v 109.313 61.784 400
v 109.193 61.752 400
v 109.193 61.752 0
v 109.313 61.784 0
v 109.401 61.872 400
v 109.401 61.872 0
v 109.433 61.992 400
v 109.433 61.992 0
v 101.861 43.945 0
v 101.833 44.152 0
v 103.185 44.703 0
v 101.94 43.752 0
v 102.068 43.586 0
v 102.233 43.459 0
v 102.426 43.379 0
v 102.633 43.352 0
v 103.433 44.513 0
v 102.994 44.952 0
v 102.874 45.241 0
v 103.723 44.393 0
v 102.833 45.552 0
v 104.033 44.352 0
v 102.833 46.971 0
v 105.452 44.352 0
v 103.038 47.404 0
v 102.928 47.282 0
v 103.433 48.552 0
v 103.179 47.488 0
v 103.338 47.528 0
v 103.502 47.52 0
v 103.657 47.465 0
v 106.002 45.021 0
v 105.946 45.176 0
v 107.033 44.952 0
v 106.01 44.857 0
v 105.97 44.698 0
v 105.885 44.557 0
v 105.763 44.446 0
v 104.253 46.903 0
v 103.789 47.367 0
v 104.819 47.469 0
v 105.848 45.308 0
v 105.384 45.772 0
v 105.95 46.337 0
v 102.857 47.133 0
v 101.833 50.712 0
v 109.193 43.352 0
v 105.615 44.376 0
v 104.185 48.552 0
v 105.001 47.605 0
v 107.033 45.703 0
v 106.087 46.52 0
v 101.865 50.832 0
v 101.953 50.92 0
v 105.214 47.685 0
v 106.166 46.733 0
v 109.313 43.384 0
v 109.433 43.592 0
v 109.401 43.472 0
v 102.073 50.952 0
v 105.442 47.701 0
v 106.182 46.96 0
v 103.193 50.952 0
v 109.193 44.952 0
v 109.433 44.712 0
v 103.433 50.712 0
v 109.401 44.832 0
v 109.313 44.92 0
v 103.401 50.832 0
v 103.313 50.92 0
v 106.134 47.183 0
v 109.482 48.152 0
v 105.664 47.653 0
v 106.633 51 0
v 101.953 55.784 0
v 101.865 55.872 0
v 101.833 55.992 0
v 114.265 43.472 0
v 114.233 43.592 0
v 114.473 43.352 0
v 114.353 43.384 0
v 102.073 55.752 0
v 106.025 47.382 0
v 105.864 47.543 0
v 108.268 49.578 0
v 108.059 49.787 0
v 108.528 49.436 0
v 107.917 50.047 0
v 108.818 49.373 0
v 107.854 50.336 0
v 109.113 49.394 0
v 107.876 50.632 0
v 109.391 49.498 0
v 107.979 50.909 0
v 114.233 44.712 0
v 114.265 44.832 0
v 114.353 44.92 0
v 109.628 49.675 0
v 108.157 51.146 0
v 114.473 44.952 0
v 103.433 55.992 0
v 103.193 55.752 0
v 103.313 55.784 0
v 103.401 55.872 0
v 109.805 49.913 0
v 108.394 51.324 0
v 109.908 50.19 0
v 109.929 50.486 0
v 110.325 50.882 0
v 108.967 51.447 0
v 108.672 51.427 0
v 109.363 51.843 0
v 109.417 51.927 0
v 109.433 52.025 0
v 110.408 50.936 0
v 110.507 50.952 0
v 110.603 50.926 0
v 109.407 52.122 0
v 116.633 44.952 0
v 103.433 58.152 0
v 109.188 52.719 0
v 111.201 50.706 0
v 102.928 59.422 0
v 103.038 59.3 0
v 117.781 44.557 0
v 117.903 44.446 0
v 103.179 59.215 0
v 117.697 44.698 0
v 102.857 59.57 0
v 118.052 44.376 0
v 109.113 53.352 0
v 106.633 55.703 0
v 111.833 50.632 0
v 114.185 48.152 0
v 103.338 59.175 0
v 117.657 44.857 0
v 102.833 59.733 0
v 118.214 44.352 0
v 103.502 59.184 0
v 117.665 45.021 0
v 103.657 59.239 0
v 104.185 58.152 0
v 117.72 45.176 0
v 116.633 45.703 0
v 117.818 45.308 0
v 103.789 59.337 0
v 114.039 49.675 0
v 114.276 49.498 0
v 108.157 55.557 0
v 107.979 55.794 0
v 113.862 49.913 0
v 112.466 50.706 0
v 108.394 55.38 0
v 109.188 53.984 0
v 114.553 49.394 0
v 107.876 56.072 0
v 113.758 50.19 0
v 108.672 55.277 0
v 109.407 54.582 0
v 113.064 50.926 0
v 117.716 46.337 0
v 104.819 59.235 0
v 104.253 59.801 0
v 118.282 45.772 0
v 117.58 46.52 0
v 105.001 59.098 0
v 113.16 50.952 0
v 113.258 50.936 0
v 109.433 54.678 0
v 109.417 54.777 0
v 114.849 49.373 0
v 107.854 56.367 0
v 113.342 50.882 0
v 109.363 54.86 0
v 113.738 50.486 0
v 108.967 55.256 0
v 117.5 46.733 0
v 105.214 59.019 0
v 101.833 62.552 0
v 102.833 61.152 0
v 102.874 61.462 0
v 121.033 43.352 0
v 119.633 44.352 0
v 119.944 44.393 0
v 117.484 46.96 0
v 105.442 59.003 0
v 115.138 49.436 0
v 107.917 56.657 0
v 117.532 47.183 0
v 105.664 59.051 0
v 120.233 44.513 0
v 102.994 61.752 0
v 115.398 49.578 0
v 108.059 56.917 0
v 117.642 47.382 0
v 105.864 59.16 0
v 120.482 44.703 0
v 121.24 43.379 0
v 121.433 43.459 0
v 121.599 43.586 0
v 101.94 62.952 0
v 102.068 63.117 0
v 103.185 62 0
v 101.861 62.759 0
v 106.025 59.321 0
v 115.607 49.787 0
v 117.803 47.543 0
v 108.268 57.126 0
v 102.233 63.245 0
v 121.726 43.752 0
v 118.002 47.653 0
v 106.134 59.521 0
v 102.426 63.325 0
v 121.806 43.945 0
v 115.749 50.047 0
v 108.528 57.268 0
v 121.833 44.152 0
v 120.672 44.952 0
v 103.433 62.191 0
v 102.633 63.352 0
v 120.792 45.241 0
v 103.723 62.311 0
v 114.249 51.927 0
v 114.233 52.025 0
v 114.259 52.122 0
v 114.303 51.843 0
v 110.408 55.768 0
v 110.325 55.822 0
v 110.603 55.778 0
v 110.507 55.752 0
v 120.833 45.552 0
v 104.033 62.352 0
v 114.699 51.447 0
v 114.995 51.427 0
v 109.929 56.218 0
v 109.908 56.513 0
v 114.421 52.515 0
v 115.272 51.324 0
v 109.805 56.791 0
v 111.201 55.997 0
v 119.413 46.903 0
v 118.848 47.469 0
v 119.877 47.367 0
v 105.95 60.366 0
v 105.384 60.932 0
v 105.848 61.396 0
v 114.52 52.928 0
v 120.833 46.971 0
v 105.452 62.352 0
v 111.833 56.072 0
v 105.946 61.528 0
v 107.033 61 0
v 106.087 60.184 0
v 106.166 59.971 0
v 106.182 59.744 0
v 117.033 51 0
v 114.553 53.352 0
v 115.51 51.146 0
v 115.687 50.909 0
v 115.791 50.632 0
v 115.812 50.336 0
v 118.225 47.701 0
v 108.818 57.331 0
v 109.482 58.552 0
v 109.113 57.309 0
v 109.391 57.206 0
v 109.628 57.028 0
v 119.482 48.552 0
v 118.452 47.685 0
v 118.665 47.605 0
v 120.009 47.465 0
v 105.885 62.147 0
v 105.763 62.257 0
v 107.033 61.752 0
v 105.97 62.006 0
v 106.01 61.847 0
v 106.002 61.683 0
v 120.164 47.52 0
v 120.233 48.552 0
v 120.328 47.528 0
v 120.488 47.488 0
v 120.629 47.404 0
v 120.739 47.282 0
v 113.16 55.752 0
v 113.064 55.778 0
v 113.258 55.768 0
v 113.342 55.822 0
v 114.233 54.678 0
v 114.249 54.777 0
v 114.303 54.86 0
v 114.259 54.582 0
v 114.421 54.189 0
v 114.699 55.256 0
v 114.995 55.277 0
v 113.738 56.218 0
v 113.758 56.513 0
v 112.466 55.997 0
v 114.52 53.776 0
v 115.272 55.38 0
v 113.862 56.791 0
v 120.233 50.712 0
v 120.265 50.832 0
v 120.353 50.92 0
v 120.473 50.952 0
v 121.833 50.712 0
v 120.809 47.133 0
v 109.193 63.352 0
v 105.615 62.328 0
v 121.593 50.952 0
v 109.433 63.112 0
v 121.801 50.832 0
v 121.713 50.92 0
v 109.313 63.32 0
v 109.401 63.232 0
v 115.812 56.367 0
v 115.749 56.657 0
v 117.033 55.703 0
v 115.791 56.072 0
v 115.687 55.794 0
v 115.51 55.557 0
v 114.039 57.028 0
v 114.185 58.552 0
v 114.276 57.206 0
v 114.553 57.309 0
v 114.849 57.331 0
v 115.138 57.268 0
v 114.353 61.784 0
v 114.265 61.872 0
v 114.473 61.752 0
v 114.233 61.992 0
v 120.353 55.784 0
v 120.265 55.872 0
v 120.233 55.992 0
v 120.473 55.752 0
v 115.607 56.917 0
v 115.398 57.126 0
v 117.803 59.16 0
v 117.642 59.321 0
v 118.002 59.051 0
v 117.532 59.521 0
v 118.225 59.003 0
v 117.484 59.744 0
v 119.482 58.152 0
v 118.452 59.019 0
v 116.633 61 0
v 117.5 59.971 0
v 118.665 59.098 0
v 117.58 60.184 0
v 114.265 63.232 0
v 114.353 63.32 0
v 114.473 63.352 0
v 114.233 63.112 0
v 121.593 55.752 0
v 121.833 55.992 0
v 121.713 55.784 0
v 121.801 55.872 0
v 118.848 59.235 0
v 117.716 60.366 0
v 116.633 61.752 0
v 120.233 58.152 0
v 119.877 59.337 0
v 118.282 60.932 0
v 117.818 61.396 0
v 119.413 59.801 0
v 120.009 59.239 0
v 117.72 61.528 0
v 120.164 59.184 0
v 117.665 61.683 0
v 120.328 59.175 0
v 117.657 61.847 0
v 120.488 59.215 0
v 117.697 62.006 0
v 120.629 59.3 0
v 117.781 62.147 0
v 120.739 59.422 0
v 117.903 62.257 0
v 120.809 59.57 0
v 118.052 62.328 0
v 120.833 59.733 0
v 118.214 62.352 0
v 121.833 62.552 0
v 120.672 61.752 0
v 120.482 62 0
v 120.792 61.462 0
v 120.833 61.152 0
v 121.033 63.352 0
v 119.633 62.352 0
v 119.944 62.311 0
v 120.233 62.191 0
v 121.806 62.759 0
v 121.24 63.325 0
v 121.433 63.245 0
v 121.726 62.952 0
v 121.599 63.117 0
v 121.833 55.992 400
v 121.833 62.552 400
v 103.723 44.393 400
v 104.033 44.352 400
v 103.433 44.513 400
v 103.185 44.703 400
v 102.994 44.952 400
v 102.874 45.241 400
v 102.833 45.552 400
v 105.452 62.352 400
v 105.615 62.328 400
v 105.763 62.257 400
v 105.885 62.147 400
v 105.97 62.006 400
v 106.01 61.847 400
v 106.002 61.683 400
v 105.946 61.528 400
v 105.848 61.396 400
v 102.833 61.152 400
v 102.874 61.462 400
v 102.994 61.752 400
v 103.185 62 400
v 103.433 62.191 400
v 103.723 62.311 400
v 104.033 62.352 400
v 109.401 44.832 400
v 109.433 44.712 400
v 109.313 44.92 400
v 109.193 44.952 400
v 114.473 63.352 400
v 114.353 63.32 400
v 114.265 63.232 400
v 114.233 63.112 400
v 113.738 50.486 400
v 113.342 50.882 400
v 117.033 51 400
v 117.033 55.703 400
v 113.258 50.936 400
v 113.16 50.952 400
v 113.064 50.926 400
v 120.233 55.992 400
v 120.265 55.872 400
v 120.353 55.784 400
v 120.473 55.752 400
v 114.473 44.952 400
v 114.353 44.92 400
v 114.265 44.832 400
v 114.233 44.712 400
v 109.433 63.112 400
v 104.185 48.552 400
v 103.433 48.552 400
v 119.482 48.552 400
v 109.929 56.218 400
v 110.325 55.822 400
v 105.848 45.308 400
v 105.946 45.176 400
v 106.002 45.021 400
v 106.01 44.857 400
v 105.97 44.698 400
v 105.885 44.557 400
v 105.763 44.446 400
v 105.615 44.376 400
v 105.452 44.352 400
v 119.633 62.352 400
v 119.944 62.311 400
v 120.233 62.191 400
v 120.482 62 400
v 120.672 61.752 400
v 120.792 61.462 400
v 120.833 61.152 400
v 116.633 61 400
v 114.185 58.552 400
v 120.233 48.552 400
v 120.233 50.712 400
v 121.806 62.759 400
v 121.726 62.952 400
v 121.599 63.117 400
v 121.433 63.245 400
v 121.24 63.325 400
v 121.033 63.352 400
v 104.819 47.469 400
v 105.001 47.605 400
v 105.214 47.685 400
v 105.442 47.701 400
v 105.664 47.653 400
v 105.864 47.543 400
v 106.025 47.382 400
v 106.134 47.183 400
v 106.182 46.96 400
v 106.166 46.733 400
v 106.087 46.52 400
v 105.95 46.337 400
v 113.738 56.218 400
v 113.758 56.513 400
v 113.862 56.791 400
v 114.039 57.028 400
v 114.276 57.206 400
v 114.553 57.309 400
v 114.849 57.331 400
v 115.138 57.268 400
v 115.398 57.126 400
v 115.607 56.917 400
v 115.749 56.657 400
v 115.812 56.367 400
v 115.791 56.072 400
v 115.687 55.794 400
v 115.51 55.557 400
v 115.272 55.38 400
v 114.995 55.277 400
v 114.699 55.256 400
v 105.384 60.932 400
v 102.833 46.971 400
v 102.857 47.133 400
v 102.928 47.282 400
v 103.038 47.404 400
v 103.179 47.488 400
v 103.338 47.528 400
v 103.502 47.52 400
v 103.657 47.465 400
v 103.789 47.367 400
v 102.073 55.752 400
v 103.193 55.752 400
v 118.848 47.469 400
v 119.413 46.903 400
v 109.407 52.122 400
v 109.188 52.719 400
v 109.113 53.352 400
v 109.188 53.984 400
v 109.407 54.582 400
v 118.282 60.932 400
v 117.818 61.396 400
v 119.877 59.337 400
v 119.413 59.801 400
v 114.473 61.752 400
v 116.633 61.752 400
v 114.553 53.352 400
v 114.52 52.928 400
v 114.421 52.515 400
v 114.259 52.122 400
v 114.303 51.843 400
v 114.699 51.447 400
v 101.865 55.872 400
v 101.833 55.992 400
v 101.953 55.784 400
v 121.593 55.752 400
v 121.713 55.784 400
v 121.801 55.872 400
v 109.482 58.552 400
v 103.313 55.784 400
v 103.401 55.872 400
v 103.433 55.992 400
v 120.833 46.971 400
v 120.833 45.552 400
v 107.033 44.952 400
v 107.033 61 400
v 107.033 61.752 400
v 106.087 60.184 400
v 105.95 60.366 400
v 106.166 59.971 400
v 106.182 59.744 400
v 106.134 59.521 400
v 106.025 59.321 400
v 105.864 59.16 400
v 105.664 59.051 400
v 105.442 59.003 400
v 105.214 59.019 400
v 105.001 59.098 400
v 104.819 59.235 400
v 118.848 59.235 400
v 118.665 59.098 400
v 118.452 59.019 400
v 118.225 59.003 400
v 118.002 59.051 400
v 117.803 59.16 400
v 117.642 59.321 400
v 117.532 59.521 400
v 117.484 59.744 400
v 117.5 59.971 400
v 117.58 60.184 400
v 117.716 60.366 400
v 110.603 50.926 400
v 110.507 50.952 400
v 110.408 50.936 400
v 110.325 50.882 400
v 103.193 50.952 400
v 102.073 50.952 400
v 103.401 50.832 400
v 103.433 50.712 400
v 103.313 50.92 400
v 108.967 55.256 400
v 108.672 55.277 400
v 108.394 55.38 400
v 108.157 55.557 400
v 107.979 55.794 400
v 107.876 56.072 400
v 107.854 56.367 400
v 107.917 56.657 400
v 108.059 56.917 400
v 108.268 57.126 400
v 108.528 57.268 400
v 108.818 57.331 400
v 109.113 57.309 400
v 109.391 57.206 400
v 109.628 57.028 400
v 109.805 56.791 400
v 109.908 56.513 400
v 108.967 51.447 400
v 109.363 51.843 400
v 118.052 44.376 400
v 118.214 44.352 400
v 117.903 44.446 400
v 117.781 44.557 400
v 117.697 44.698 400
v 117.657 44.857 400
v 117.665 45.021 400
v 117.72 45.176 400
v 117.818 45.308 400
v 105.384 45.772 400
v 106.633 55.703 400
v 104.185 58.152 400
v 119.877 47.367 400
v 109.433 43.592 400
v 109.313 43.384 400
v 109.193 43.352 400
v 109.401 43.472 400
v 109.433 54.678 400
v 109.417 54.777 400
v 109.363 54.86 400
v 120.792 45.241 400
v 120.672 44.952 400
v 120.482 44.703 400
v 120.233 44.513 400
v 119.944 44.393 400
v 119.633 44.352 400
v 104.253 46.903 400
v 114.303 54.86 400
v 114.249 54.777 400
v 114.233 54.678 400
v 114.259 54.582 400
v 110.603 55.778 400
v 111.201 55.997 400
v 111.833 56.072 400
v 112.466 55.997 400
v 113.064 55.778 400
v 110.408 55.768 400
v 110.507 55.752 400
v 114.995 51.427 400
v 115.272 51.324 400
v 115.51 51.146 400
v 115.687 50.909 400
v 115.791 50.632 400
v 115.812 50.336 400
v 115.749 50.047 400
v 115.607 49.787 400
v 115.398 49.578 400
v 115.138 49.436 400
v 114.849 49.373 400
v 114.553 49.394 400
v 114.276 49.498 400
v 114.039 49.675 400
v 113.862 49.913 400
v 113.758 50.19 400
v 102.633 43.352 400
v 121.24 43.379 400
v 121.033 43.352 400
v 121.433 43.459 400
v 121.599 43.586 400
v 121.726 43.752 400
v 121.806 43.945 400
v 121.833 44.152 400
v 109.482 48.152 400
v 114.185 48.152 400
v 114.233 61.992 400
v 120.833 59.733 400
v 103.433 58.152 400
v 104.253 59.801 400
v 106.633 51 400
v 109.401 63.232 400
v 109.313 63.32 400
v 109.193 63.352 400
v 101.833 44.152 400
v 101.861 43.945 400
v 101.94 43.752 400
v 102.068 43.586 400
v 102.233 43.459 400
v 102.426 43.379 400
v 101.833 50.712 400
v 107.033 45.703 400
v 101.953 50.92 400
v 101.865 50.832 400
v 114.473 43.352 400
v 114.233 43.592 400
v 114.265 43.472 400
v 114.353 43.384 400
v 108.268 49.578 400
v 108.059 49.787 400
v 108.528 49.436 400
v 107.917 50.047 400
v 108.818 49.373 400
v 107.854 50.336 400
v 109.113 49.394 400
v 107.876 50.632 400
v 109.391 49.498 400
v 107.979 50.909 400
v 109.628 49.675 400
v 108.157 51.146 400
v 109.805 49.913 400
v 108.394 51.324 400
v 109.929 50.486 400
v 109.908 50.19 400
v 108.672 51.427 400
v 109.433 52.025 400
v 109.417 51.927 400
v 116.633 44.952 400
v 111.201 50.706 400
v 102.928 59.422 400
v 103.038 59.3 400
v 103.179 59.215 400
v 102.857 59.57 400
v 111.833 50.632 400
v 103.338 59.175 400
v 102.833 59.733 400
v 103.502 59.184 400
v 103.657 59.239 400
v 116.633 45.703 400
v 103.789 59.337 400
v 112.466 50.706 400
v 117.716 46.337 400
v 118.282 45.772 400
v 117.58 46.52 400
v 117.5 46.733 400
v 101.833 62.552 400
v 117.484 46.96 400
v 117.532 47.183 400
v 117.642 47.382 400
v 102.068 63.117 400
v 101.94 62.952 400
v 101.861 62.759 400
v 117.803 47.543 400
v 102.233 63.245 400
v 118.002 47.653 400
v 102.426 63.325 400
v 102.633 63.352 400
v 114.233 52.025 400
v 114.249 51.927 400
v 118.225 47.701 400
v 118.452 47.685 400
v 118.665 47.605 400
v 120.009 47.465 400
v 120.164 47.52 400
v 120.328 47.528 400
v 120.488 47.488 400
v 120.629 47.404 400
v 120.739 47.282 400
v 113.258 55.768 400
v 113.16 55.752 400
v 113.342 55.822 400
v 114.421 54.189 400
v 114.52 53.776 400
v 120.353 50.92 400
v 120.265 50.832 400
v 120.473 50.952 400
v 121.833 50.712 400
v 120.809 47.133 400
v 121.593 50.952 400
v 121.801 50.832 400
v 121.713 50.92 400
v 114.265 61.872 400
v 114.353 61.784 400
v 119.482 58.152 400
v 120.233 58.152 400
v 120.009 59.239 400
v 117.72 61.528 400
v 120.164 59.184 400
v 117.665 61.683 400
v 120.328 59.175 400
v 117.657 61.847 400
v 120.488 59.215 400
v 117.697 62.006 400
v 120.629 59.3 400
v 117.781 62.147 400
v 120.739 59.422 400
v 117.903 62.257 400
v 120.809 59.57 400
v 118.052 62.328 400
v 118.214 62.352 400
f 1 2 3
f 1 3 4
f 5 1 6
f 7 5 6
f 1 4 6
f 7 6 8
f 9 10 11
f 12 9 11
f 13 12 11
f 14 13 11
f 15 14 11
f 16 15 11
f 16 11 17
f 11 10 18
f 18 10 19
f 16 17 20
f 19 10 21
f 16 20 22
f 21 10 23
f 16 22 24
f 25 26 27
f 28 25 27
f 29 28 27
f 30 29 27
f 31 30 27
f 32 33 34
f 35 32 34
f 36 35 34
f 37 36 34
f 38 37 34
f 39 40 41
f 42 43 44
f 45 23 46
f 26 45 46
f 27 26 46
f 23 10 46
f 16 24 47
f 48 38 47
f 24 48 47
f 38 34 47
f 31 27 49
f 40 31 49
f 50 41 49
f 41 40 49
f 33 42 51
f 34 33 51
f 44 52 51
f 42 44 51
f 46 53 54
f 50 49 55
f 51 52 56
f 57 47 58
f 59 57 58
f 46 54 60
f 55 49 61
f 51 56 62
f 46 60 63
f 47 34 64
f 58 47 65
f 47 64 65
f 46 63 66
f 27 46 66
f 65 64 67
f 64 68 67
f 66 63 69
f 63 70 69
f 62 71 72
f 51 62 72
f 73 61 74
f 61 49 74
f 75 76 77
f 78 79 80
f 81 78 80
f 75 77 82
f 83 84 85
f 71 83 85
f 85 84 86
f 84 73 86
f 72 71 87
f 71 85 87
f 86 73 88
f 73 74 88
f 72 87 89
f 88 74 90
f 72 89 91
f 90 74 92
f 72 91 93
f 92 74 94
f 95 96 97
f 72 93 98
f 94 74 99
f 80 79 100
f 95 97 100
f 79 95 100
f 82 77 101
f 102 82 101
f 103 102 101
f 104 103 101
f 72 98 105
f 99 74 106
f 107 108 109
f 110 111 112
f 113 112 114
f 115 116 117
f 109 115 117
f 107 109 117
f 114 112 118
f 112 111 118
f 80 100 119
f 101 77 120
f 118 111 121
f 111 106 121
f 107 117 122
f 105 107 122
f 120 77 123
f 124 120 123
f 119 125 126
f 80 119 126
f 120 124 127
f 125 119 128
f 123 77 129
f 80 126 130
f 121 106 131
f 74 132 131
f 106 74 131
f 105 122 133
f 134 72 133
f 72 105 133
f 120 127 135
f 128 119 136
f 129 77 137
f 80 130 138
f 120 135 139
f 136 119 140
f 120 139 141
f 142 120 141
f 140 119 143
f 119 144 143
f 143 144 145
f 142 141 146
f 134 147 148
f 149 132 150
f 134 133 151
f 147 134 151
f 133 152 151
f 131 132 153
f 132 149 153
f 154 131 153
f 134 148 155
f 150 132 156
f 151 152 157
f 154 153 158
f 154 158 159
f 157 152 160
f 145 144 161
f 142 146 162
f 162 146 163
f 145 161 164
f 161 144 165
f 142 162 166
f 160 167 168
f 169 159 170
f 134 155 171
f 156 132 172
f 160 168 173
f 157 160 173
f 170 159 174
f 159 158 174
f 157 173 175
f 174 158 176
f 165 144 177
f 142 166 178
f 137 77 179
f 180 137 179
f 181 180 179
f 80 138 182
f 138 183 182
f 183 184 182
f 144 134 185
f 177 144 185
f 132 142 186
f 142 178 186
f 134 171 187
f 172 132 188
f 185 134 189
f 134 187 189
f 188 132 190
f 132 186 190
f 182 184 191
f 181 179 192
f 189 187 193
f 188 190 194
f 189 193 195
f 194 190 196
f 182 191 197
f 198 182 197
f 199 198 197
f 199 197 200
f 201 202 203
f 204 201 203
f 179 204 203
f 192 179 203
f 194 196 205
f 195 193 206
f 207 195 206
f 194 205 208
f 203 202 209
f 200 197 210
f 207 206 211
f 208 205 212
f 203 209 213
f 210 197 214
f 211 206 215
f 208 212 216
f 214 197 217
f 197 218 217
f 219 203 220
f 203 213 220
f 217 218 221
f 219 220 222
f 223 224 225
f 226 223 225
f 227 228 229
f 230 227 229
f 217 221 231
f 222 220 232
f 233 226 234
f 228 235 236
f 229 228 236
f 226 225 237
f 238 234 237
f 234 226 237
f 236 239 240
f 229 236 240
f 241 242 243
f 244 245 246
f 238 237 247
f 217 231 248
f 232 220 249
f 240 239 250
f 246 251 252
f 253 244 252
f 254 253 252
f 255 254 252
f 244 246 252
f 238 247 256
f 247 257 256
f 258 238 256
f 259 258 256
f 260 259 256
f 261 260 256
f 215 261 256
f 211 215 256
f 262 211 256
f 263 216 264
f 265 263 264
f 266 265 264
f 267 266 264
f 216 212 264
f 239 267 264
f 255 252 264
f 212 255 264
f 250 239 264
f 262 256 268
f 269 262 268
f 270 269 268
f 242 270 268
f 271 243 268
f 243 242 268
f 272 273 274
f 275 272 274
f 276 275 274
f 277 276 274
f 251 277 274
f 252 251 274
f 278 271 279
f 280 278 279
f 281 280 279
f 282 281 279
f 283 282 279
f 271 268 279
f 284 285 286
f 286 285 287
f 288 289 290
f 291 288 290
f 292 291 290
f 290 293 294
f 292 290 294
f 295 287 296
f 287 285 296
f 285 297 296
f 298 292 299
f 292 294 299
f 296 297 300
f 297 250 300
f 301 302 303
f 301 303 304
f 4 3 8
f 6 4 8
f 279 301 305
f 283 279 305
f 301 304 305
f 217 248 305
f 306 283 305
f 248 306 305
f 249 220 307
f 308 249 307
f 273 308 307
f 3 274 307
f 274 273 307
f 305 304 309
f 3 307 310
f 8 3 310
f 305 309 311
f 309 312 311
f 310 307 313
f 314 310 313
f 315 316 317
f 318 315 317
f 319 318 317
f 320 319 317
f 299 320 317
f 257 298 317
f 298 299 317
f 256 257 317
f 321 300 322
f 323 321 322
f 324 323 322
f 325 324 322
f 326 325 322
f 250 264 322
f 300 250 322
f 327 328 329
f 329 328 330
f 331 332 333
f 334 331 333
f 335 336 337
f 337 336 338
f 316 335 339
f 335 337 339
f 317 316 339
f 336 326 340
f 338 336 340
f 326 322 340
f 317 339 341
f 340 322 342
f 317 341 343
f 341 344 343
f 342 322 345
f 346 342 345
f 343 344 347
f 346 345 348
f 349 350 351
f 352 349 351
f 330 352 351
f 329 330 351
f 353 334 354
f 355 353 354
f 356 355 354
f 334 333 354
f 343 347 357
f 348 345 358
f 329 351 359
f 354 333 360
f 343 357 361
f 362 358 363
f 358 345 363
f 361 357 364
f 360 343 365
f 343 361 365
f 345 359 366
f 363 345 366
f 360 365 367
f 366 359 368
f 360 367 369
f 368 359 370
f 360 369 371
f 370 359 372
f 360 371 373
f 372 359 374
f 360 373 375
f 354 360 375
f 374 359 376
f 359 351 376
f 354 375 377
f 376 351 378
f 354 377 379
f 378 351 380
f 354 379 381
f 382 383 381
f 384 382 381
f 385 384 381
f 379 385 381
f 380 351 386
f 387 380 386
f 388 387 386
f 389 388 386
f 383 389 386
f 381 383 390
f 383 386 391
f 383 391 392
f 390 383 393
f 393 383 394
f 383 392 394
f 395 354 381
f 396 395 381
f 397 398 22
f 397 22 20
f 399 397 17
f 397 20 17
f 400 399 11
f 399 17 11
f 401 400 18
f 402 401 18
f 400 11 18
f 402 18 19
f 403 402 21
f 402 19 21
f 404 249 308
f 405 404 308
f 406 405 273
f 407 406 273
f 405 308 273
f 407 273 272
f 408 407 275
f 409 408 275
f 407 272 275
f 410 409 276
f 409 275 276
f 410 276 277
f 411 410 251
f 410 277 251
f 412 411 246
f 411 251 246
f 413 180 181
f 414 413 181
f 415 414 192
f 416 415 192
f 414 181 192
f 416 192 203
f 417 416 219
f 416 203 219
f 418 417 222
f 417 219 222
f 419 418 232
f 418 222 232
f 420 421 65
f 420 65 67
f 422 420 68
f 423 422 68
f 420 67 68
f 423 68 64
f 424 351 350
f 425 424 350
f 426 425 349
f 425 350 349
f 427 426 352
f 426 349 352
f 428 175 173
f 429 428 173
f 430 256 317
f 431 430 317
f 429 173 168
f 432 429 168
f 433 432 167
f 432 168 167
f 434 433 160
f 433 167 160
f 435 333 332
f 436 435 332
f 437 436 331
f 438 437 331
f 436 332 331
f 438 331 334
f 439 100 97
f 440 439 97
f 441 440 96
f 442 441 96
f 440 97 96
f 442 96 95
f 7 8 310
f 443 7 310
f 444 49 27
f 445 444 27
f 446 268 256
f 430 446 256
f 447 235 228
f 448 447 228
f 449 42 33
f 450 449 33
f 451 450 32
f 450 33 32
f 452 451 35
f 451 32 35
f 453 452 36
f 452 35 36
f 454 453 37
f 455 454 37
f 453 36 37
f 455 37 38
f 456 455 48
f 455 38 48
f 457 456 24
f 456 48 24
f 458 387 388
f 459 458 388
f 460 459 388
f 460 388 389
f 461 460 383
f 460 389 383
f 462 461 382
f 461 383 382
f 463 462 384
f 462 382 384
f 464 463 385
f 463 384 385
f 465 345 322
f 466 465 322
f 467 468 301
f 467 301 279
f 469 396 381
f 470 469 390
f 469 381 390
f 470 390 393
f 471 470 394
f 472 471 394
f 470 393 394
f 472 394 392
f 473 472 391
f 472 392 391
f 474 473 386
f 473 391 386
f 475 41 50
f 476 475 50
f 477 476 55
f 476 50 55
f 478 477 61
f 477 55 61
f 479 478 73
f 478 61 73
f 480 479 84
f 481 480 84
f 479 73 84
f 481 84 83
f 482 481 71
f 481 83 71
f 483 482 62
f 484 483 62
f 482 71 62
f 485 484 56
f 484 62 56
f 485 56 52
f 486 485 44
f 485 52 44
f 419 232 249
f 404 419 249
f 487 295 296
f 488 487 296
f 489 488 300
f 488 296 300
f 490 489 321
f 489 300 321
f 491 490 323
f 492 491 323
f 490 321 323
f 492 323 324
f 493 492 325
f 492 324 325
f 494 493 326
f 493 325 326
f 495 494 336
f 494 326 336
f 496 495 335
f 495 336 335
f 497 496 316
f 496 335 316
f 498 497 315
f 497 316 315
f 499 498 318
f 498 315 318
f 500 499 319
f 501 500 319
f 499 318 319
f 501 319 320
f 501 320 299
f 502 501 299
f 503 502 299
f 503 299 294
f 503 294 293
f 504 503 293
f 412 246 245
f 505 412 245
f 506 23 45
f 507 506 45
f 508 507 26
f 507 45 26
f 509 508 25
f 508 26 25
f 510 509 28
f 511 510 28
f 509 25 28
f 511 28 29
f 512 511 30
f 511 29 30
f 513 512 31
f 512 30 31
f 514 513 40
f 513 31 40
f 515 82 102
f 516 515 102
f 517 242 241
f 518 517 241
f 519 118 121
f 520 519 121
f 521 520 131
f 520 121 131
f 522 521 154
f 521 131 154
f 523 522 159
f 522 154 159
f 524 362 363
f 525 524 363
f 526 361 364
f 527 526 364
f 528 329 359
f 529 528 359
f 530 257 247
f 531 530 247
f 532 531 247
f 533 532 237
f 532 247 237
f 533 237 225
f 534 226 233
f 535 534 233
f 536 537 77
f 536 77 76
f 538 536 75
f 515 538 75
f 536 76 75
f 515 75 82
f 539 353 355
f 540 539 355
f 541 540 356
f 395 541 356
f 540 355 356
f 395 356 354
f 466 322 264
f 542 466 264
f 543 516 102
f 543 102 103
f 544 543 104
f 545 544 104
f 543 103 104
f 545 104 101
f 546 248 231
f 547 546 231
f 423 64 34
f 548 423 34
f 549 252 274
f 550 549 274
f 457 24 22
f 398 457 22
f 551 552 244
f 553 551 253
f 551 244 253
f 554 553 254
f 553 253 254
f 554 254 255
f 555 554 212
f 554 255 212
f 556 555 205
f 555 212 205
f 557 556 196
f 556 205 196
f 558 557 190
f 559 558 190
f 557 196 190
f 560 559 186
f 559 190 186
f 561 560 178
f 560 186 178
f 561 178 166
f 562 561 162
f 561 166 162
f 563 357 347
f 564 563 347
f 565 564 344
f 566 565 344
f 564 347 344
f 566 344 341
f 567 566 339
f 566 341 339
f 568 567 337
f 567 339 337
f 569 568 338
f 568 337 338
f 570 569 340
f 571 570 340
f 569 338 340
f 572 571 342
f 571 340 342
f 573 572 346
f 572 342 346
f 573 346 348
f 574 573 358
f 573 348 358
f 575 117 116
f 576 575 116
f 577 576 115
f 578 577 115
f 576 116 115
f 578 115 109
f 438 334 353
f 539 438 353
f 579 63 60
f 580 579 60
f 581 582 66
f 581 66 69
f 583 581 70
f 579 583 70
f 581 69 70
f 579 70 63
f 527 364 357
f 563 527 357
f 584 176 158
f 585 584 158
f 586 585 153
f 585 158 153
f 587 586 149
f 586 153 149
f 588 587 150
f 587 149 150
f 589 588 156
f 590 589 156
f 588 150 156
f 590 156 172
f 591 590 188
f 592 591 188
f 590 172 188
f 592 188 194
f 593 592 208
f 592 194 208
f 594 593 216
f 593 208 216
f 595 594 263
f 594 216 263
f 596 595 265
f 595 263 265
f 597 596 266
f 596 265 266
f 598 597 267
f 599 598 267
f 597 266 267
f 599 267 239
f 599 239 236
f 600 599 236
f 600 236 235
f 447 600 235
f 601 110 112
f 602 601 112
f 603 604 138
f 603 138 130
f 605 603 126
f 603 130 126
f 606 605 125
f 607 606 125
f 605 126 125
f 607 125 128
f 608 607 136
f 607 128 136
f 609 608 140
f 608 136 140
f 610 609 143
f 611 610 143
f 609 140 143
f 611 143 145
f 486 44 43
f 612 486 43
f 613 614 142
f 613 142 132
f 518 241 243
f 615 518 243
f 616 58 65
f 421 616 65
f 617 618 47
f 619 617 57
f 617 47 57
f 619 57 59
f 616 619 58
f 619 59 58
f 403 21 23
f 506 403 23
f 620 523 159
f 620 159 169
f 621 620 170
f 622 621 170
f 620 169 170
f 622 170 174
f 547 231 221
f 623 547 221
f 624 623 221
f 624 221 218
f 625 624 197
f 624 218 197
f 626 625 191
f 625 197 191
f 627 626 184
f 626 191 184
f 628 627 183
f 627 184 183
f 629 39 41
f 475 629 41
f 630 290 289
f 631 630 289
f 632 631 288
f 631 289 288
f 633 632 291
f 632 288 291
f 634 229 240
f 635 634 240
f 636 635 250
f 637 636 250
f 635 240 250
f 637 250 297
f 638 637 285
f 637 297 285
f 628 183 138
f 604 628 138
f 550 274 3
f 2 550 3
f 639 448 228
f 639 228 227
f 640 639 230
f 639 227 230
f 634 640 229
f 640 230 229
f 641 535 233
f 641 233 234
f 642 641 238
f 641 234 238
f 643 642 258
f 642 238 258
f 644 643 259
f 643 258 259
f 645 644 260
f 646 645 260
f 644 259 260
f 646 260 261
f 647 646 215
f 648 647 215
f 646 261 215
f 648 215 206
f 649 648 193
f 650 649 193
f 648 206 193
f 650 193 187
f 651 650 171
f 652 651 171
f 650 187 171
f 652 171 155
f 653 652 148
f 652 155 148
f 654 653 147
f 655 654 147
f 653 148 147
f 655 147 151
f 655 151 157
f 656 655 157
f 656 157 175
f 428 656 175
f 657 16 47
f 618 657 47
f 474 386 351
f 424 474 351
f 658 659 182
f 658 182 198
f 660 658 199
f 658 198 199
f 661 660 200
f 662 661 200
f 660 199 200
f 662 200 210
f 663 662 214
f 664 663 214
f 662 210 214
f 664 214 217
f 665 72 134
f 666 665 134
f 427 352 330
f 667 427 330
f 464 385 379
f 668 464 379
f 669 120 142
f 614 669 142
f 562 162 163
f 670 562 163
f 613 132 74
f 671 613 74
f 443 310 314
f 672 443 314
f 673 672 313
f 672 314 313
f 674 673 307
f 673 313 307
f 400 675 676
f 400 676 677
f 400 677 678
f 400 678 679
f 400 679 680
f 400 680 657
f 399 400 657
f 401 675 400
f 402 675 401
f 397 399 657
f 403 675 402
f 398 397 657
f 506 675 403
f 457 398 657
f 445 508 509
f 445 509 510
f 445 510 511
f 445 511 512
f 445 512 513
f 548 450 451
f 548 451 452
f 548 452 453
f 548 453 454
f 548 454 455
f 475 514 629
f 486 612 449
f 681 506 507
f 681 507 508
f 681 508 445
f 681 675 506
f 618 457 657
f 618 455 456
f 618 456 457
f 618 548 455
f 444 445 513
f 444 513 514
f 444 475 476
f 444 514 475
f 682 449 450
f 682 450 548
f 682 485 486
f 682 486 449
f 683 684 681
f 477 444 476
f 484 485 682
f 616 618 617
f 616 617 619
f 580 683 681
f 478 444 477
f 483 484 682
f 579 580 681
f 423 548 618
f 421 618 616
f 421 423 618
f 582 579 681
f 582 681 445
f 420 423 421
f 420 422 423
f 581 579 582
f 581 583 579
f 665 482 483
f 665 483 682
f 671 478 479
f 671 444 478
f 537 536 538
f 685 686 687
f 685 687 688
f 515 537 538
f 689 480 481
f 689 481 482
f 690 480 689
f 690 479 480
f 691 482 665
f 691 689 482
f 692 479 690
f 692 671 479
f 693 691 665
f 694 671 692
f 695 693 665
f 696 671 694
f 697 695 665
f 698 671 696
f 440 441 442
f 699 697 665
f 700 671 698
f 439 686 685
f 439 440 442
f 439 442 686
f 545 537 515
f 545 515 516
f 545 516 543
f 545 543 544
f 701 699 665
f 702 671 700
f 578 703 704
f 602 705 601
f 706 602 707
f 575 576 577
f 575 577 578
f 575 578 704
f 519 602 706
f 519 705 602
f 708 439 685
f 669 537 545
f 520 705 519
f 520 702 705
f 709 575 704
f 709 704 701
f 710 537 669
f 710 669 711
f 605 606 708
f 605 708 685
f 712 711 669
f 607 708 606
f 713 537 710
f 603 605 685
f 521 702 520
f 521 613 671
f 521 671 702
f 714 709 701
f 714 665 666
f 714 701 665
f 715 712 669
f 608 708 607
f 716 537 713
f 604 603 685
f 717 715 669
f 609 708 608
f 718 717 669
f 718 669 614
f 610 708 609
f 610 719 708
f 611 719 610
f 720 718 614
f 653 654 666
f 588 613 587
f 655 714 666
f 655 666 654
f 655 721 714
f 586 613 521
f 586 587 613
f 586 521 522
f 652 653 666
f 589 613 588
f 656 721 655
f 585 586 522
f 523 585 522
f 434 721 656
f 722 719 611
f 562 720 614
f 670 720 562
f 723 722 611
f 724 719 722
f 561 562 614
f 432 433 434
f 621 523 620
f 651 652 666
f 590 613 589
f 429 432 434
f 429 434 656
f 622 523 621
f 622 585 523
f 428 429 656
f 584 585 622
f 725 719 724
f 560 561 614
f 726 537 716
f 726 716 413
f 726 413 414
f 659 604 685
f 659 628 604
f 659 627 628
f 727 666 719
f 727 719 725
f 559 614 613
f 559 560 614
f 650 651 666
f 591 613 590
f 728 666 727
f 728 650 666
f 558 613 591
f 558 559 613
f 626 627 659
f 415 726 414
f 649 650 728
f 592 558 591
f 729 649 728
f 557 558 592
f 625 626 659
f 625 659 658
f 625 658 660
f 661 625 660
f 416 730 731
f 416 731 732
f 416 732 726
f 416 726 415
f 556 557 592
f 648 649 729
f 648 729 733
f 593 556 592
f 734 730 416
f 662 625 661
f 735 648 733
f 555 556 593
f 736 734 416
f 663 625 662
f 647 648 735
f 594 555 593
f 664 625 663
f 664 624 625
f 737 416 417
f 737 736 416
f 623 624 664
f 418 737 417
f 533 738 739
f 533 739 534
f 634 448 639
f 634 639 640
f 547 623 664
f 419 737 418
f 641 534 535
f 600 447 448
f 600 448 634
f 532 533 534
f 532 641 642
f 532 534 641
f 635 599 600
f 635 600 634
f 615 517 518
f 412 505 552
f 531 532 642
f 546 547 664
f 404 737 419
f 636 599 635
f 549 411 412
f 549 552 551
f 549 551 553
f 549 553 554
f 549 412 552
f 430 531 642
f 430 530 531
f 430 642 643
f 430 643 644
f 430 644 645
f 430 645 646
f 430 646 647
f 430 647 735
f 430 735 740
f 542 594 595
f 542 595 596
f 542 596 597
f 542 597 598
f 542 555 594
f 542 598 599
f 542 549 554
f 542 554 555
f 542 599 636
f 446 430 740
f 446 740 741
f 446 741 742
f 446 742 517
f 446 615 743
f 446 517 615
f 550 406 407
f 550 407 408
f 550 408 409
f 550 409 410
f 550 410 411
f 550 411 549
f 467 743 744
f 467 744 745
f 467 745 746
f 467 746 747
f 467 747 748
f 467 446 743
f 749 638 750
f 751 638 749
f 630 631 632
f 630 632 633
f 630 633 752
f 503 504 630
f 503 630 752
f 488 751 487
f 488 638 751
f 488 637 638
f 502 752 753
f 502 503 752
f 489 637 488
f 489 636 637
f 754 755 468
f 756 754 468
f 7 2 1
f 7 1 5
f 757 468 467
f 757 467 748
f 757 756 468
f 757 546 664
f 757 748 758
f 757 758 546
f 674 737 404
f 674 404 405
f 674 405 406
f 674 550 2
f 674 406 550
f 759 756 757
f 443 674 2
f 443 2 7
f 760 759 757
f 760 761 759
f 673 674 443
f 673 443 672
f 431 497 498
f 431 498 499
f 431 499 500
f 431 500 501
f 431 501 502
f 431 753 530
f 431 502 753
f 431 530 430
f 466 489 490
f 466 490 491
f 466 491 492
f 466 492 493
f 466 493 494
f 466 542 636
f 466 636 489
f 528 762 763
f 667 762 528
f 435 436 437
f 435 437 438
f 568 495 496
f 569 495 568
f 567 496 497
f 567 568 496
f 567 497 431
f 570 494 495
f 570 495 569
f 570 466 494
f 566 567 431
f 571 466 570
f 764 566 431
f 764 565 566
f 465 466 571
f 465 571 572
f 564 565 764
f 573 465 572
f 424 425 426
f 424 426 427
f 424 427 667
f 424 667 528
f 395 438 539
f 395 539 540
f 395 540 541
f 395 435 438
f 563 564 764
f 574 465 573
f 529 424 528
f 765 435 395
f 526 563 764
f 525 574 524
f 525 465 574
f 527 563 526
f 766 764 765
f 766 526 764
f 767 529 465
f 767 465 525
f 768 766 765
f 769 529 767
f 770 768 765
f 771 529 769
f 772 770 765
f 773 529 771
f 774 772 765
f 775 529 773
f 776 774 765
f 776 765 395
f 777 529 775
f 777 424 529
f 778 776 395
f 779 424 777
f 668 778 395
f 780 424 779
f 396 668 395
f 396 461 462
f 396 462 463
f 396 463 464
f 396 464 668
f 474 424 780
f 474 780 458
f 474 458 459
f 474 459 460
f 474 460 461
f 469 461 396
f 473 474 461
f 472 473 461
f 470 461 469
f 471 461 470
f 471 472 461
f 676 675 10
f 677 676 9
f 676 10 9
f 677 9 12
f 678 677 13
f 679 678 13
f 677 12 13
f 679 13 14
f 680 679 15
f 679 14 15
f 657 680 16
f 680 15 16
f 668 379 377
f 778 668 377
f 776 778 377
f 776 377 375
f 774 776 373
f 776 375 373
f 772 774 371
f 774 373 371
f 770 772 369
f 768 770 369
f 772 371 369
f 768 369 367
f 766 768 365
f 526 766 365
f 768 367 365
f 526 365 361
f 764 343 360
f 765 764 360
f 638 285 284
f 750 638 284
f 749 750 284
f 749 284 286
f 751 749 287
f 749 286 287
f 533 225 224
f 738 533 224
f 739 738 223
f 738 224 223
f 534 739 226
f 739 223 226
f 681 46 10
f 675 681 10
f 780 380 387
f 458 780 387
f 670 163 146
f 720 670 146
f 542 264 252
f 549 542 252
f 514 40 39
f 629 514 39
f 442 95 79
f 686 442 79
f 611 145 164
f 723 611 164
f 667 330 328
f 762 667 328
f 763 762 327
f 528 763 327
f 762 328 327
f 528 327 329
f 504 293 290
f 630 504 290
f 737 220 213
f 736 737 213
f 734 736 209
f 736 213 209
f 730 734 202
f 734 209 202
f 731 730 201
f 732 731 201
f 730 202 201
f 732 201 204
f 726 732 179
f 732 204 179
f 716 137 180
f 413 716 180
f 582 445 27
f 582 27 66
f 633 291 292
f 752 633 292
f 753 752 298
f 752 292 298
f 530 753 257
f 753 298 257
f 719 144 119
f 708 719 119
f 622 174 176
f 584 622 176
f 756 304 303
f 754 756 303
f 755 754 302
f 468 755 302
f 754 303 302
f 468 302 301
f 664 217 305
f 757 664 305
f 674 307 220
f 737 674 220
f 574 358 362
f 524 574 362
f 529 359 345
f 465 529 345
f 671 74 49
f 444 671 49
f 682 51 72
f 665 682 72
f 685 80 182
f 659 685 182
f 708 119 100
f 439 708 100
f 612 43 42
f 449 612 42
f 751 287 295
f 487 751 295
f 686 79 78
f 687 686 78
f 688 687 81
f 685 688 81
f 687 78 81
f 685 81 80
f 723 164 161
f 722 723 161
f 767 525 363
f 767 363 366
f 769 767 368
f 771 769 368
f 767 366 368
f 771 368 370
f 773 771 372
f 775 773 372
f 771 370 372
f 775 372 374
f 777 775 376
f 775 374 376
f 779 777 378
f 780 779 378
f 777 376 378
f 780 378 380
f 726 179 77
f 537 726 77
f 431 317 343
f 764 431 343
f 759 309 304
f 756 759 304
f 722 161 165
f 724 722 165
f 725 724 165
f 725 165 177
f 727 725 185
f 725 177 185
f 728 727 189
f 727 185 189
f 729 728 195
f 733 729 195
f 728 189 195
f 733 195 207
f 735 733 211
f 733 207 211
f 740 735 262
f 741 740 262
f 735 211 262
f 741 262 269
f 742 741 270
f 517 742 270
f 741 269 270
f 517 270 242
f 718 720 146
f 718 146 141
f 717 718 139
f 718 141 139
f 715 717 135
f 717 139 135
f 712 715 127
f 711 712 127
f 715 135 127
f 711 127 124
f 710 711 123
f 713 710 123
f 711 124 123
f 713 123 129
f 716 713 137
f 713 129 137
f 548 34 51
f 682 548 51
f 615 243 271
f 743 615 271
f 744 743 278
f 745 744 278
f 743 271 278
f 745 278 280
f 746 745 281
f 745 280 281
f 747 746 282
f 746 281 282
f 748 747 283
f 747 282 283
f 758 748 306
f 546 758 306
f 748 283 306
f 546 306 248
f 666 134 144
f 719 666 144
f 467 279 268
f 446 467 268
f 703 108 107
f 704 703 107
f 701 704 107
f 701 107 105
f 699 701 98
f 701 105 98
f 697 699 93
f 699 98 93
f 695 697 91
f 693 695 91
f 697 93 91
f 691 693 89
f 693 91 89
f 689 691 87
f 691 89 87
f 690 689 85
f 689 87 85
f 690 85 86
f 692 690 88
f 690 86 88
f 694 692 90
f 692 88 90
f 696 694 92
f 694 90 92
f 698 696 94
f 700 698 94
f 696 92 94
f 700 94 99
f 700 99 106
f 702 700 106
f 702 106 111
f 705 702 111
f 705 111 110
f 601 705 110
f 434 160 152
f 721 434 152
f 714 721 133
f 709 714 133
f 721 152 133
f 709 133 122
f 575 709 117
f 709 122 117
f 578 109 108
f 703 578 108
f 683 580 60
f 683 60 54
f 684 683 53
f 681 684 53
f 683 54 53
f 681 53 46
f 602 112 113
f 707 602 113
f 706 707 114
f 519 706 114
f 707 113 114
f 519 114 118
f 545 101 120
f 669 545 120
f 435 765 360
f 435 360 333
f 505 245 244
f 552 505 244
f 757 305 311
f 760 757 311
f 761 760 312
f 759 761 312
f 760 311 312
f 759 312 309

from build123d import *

# Parameters (mm, degrees)
F1_DEPTH = 400


# Not quite as in the source:
# - ends of sketch curves that miss each other by under 0.0002 mm in the source are joined


with BuildPart() as f1:
    # F0 (on Top) → F1 (new body)
    with BuildSketch(Plane.XY):
        with BuildLine():
            ThreePointArc((121.8332443976, 62.5518085142), (121.5989298226, 63.1174939391), (121.0332443976, 63.3518085142))
            Line((121.0332443976, 63.3518085142), (114.4732443976, 63.3518085142))
            ThreePointArc((114.4732443976, 63.3518085142), (114.3035387701, 63.2815141417), (114.2332443976, 63.1118085142))
            Line((114.2332443976, 63.1118085142), (114.2332443976, 61.9918085142))
            ThreePointArc((114.2332443976, 61.9918085142), (114.3035387701, 61.8221028867), (114.4732443976, 61.7518085142))
            Line((114.4732443976, 61.7518085142), (116.6332443976, 61.7518085142))
            Line((116.6332443976, 61.7518085142), (116.6332443976, 61.0003365142))
            Line((116.6332443976, 61.0003365142), (114.1847163976, 58.5518085142))
            Line((114.1847163976, 58.5518085142), (109.4817731976, 58.5518085142))
            Line((109.4817731976, 58.5518085142), (107.0332443976, 61.0003365142))
            Line((107.0332443976, 61.0003365142), (107.0332443976, 61.7518085142))
            Line((107.0332443976, 61.7518085142), (109.1932443976, 61.7518085142))
            ThreePointArc((109.1932443976, 61.7518085142), (109.3629500251, 61.8221028867), (109.4332443976, 61.9918085142))
            Line((109.4332443976, 61.9918085142), (109.4332443976, 63.1118085142))
            ThreePointArc((109.4332443976, 63.1118085142), (109.3629500251, 63.2815141417), (109.1932443976, 63.3518085142))
            Line((109.1932443976, 63.3518085142), (102.6332443976, 63.3518085142))
            ThreePointArc((102.6332443976, 63.3518085142), (102.0675589727, 63.1174939391), (101.8332443976, 62.5518085142))
            Line((101.8332443976, 62.5518085142), (101.8332443976, 55.9918085142))
            ThreePointArc((101.8332443976, 55.9918085142), (101.9035387701, 55.8221028867), (102.0732443976, 55.7518085142))
            Line((102.0732443976, 55.7518085142), (103.1932443976, 55.7518085142))
            ThreePointArc((103.1932443976, 55.7518085142), (103.3629500251, 55.8221028867), (103.4332443976, 55.9918085142))
            Line((103.4332443976, 55.9918085142), (103.4332443976, 58.1518085142))
            Line((103.4332443976, 58.1518085142), (104.1847163976, 58.1518085142))
            Line((104.1847163976, 58.1518085142), (106.6332439976, 55.7032801142))
            Line((106.6332439976, 55.7032801142), (106.6332439976, 51.0003365142))
            Line((106.6332439976, 51.0003365142), (104.1847163976, 48.5518085142))
            Line((104.1847163976, 48.5518085142), (103.4332443976, 48.5518085142))
            Line((103.4332443976, 48.5518085142), (103.4332443976, 50.7118085142))
            ThreePointArc((103.4332443976, 50.7118085142), (103.3629500251, 50.8815141417), (103.1932443976, 50.9518085142))
            Line((103.1932443976, 50.9518085142), (102.0732443976, 50.9518085142))
            ThreePointArc((102.0732443976, 50.9518085142), (101.9035387701, 50.8815141417), (101.8332443976, 50.7118085142))
            Line((101.8332443976, 50.7118085142), (101.8332443976, 44.1518085142))
            ThreePointArc((101.8332443976, 44.1518085142), (102.0675589727, 43.5861230892), (102.6332443976, 43.3518085142))
            Line((102.6332443976, 43.3518085142), (109.1932443976, 43.3518085142))
            ThreePointArc((109.1932443976, 43.3518085142), (109.3629500251, 43.4221028867), (109.4332443976, 43.5918085142))
            Line((109.4332443976, 43.5918085142), (109.4332443976, 44.7118085142))
            ThreePointArc((109.4332443976, 44.7118085142), (109.3629500251, 44.8815141417), (109.1932443976, 44.9518085142))
            Line((109.1932443976, 44.9518085142), (107.0332443976, 44.9518085142))
            Line((107.0332443976, 44.9518085142), (107.0332443976, 45.7032805142))
            Line((107.0332443976, 45.7032805142), (109.4817723976, 48.1518077142))
            Line((109.4817723976, 48.1518077142), (114.1847163976, 48.1518077142))
            Line((114.1847163976, 48.1518077142), (116.6332439976, 45.7032801142))
            Line((116.6332439976, 45.7032801142), (116.6332443976, 44.9518085142))
            Line((116.6332443976, 44.9518085142), (114.4732443976, 44.9518085142))
            ThreePointArc((114.4732443976, 44.9518085142), (114.3035387701, 44.8815141417), (114.2332443976, 44.7118085142))
            Line((114.2332443976, 44.7118085142), (114.2332443976, 43.5918085142))
            ThreePointArc((114.2332443976, 43.5918085142), (114.3035387701, 43.4221028867), (114.4732443976, 43.3518085142))
            Line((114.4732443976, 43.3518085142), (121.0332443976, 43.3518085142))
            ThreePointArc((121.0332443976, 43.3518085142), (121.5989298226, 43.5861230892), (121.8332443976, 44.1518085142))
            Line((121.8332443976, 44.1518085142), (121.8332443976, 50.7118085142))
            ThreePointArc((121.8332443976, 50.7118085142), (121.7629500251, 50.8815141417), (121.5932443976, 50.9518085142))
            Line((121.5932443976, 50.9518085142), (120.4732443976, 50.9518085142))
            ThreePointArc((120.4732443976, 50.9518085142), (120.3035387701, 50.8815141417), (120.2332443976, 50.7118085142))
            Line((120.2332443976, 50.7118085142), (120.2332443976, 48.5518085142))
            Line((120.2332443976, 48.5518085142), (119.4817731976, 48.5518085142))
            Line((119.4817731976, 48.5518085142), (117.0332443976, 51.0003365142))
            Line((117.0332443976, 51.0003365142), (117.0332443976, 55.7032797142))
            Line((117.0332443976, 55.7032797142), (119.4817723976, 58.1518077142))
            Line((119.4817723976, 58.1518077142), (120.2332451976, 58.1518085142))
            Line((120.2332451976, 58.1518085142), (120.2332443976, 55.9918085142))
            ThreePointArc((120.2332443976, 55.9918085142), (120.3035387701, 55.8221028867), (120.4732443976, 55.7518085142))
            Line((120.4732443976, 55.7518085142), (121.5932443976, 55.7518085142))
            ThreePointArc((121.5932443976, 55.7518085142), (121.7629500251, 55.8221028867), (121.8332443976, 55.9918085142))
            Line((121.8332443976, 55.9918085142), (121.8332443976, 62.5518085142))
        make_face()
        with BuildLine():
            Line((105.3844307976, 45.7716237142), (105.8482667976, 45.3077877142))
            ThreePointArc((105.8482667976, 45.3077877142), (105.9696592276, 44.6975055307), (105.4522867976, 44.3518085142))
            Line((105.4522867976, 44.3518085142), (104.0332443976, 44.3518085142))
            ThreePointArc((104.0332443976, 44.3518085142), (103.1847162602, 44.7032803768), (102.8332443976, 45.5518085142))
            Line((102.8332443976, 45.5518085142), (102.8332443976, 46.9708501142))
            ThreePointArc((102.8332443976, 46.9708501142), (103.1789416755, 47.4882226524), (103.7892241951, 47.3668299116))
            Line((103.7892241951, 47.3668299116), (104.2530603976, 46.9029941142))
            Line((104.2530603976, 46.9029941142), (104.8187451976, 47.4686797142))
            ThreePointArc((104.8187451976, 47.4686797142), (105.9501162226, 47.4686795391), (105.9501162226, 46.3373086892))
            Line((105.9501162226, 46.3373086892), (105.3844307976, 45.7716237142))
        make_face(mode=Mode.SUBTRACT)
        with BuildLine():
            ThreePointArc((118.2142027976, 44.3518085142), (117.6968303676, 44.6975055307), (117.8182226001, 45.3077879116))
            Line((117.8182226001, 45.3077879116), (118.2820587976, 45.7716237142))
            Line((118.2820587976, 45.7716237142), (117.7163731976, 46.3373085142))
            ThreePointArc((117.7163731976, 46.3373085142), (117.7163733727, 47.4686795391), (118.8477442226, 47.4686795391))
            Line((118.8477442226, 47.4686795391), (119.4134291976, 46.9029941142))
            Line((119.4134291976, 46.9029941142), (119.8772651976, 47.3668301142))
            ThreePointArc((119.8772651976, 47.3668301142), (120.487547381, 47.4882225442), (120.8332443976, 46.9708501142))
            Line((120.8332443976, 46.9708501142), (120.8332443976, 45.5518085142))
            ThreePointArc((120.8332443976, 45.5518085142), (120.481772535, 44.7032803768), (119.6332443976, 44.3518085142))
            Line((119.6332443976, 44.3518085142), (118.2142027976, 44.3518085142))
        make_face(mode=Mode.SUBTRACT)
        with BuildLine():
            ThreePointArc((110.602965129, 55.7776718494), (111.8332447543, 56.0718085142), (113.0635243025, 55.7776715267))
            ThreePointArc((113.0635243025, 55.7776715267), (113.2098459972, 55.7547084557), (113.3417836251, 55.8220124867))
            Line((113.3417836251, 55.8220124867), (113.7375595976, 56.2177877142))
            ThreePointArc((113.7375595976, 56.2177877142), (115.51020025, 57.0287635666), (114.6992243904, 55.2561228157))
            Line((114.6992243904, 55.2561228157), (114.3034491976, 54.8603469142))
            ThreePointArc((114.3034491976, 54.8603469142), (114.2361451391, 54.7284093138), (114.2591079246, 54.5820874743))
            ThreePointArc((114.2591079246, 54.5820874743), (114.4786884735, 53.9842843173), (114.5532443976, 53.3518085142))
            ThreePointArc((114.5532443976, 53.3518085142), (114.4786883905, 52.7193323641), (114.2591075738, 52.121528932))
            ThreePointArc((114.2591075738, 52.121528932), (114.2361451391, 51.9752069146), (114.3034491701, 51.8432692867))
            Line((114.3034491701, 51.8432692867), (114.6992243976, 51.4474933142))
            ThreePointArc((114.6992243976, 51.4474933142), (115.51020025, 49.6748526618), (113.7375594992, 50.4858285214))
            Line((113.7375594992, 50.4858285214), (113.3417835976, 50.8816037142))
            ThreePointArc((113.3417835976, 50.8816037142), (113.2098461759, 50.9489077442), (113.0635244804, 50.9259451509))
            ThreePointArc((113.0635244804, 50.9259451509), (111.8332447543, 50.6318085142), (110.602965129, 50.9259451789))
            ThreePointArc((110.602965129, 50.9259451789), (110.4566434193, 50.9489077442), (110.3247059701, 50.8816037417))
            Line((110.3247059701, 50.8816037417), (109.9289299976, 50.4858285142))
            ThreePointArc((109.9289299976, 50.4858285142), (108.1562893452, 49.6748526618), (108.9672652048, 51.4474934126))
            Line((108.9672652048, 51.4474934126), (109.3630403976, 51.8432693142))
            ThreePointArc((109.3630403976, 51.8432693142), (109.4303444561, 51.9752069146), (109.4073816706, 52.1215287541))
            ThreePointArc((109.4073816706, 52.1215287541), (109.1132443976, 53.3518081574), (109.4073810624, 54.5820877828))
            ThreePointArc((109.4073810624, 54.5820877828), (109.4303444561, 54.7284093138), (109.3630404251, 54.8603469417))
            Line((109.3630404251, 54.8603469417), (108.9672651976, 55.2561229142))
            ThreePointArc((108.9672651976, 55.2561229142), (108.1562893452, 57.0287635666), (109.928930096, 56.217787707))
            Line((109.928930096, 56.217787707), (110.3247059976, 55.8220125142))
            ThreePointArc((110.3247059976, 55.8220125142), (110.456643598, 55.7547084557), (110.602965129, 55.7776718494))
        make_face(mode=Mode.SUBTRACT)
        with BuildLine():
            ThreePointArc((105.4522867976, 62.3518085142), (105.9696593358, 62.0061112363), (105.8482665951, 61.3958287167))
            Line((105.8482665951, 61.3958287167), (105.3844307976, 60.9319925142))
            Line((105.3844307976, 60.9319925142), (105.9501163976, 60.3663077142))
            ThreePointArc((105.9501163976, 60.3663077142), (105.9501162226, 59.2349366892), (104.8187453727, 59.2349366892))
            Line((104.8187453727, 59.2349366892), (104.2530603976, 59.8006221142))
            Line((104.2530603976, 59.8006221142), (103.7892243976, 59.3367861142))
            ThreePointArc((103.7892243976, 59.3367861142), (103.1789416755, 59.215393576), (102.8332443976, 59.7327661142))
            Line((102.8332443976, 59.7327661142), (102.8332443976, 61.1518085142))
            ThreePointArc((102.8332443976, 61.1518085142), (103.1847162602, 62.0003366516), (104.0332443976, 62.3518085142))
            Line((104.0332443976, 62.3518085142), (105.4522867976, 62.3518085142))
        make_face(mode=Mode.SUBTRACT)
        with BuildLine():
            Line((118.2820587976, 60.9319925142), (117.8182227976, 61.3958285142))
            ThreePointArc((117.8182227976, 61.3958285142), (117.6968302594, 62.0061112363), (118.2142027976, 62.3518085142))
            Line((118.2142027976, 62.3518085142), (119.6332443976, 62.3518085142))
            ThreePointArc((119.6332443976, 62.3518085142), (120.481772535, 62.0003366516), (120.8332443976, 61.1518085142))
            Line((120.8332443976, 61.1518085142), (120.8332443976, 59.7327661142))
            ThreePointArc((120.8332443976, 59.7327661142), (120.487547381, 59.2153936842), (119.8772650001, 59.3367859167))
            Line((119.8772650001, 59.3367859167), (119.4134291976, 59.8006221142))
            Line((119.4134291976, 59.8006221142), (118.8477443976, 59.2349365142))
            ThreePointArc((118.8477443976, 59.2349365142), (117.7163733727, 59.2349366892), (117.7163733727, 60.3663075391))
            Line((117.7163733727, 60.3663075391), (118.2820587976, 60.9319925142))
        make_face(mode=Mode.SUBTRACT)
    extrude(amount=F1_DEPTH)


solid = f1.part
